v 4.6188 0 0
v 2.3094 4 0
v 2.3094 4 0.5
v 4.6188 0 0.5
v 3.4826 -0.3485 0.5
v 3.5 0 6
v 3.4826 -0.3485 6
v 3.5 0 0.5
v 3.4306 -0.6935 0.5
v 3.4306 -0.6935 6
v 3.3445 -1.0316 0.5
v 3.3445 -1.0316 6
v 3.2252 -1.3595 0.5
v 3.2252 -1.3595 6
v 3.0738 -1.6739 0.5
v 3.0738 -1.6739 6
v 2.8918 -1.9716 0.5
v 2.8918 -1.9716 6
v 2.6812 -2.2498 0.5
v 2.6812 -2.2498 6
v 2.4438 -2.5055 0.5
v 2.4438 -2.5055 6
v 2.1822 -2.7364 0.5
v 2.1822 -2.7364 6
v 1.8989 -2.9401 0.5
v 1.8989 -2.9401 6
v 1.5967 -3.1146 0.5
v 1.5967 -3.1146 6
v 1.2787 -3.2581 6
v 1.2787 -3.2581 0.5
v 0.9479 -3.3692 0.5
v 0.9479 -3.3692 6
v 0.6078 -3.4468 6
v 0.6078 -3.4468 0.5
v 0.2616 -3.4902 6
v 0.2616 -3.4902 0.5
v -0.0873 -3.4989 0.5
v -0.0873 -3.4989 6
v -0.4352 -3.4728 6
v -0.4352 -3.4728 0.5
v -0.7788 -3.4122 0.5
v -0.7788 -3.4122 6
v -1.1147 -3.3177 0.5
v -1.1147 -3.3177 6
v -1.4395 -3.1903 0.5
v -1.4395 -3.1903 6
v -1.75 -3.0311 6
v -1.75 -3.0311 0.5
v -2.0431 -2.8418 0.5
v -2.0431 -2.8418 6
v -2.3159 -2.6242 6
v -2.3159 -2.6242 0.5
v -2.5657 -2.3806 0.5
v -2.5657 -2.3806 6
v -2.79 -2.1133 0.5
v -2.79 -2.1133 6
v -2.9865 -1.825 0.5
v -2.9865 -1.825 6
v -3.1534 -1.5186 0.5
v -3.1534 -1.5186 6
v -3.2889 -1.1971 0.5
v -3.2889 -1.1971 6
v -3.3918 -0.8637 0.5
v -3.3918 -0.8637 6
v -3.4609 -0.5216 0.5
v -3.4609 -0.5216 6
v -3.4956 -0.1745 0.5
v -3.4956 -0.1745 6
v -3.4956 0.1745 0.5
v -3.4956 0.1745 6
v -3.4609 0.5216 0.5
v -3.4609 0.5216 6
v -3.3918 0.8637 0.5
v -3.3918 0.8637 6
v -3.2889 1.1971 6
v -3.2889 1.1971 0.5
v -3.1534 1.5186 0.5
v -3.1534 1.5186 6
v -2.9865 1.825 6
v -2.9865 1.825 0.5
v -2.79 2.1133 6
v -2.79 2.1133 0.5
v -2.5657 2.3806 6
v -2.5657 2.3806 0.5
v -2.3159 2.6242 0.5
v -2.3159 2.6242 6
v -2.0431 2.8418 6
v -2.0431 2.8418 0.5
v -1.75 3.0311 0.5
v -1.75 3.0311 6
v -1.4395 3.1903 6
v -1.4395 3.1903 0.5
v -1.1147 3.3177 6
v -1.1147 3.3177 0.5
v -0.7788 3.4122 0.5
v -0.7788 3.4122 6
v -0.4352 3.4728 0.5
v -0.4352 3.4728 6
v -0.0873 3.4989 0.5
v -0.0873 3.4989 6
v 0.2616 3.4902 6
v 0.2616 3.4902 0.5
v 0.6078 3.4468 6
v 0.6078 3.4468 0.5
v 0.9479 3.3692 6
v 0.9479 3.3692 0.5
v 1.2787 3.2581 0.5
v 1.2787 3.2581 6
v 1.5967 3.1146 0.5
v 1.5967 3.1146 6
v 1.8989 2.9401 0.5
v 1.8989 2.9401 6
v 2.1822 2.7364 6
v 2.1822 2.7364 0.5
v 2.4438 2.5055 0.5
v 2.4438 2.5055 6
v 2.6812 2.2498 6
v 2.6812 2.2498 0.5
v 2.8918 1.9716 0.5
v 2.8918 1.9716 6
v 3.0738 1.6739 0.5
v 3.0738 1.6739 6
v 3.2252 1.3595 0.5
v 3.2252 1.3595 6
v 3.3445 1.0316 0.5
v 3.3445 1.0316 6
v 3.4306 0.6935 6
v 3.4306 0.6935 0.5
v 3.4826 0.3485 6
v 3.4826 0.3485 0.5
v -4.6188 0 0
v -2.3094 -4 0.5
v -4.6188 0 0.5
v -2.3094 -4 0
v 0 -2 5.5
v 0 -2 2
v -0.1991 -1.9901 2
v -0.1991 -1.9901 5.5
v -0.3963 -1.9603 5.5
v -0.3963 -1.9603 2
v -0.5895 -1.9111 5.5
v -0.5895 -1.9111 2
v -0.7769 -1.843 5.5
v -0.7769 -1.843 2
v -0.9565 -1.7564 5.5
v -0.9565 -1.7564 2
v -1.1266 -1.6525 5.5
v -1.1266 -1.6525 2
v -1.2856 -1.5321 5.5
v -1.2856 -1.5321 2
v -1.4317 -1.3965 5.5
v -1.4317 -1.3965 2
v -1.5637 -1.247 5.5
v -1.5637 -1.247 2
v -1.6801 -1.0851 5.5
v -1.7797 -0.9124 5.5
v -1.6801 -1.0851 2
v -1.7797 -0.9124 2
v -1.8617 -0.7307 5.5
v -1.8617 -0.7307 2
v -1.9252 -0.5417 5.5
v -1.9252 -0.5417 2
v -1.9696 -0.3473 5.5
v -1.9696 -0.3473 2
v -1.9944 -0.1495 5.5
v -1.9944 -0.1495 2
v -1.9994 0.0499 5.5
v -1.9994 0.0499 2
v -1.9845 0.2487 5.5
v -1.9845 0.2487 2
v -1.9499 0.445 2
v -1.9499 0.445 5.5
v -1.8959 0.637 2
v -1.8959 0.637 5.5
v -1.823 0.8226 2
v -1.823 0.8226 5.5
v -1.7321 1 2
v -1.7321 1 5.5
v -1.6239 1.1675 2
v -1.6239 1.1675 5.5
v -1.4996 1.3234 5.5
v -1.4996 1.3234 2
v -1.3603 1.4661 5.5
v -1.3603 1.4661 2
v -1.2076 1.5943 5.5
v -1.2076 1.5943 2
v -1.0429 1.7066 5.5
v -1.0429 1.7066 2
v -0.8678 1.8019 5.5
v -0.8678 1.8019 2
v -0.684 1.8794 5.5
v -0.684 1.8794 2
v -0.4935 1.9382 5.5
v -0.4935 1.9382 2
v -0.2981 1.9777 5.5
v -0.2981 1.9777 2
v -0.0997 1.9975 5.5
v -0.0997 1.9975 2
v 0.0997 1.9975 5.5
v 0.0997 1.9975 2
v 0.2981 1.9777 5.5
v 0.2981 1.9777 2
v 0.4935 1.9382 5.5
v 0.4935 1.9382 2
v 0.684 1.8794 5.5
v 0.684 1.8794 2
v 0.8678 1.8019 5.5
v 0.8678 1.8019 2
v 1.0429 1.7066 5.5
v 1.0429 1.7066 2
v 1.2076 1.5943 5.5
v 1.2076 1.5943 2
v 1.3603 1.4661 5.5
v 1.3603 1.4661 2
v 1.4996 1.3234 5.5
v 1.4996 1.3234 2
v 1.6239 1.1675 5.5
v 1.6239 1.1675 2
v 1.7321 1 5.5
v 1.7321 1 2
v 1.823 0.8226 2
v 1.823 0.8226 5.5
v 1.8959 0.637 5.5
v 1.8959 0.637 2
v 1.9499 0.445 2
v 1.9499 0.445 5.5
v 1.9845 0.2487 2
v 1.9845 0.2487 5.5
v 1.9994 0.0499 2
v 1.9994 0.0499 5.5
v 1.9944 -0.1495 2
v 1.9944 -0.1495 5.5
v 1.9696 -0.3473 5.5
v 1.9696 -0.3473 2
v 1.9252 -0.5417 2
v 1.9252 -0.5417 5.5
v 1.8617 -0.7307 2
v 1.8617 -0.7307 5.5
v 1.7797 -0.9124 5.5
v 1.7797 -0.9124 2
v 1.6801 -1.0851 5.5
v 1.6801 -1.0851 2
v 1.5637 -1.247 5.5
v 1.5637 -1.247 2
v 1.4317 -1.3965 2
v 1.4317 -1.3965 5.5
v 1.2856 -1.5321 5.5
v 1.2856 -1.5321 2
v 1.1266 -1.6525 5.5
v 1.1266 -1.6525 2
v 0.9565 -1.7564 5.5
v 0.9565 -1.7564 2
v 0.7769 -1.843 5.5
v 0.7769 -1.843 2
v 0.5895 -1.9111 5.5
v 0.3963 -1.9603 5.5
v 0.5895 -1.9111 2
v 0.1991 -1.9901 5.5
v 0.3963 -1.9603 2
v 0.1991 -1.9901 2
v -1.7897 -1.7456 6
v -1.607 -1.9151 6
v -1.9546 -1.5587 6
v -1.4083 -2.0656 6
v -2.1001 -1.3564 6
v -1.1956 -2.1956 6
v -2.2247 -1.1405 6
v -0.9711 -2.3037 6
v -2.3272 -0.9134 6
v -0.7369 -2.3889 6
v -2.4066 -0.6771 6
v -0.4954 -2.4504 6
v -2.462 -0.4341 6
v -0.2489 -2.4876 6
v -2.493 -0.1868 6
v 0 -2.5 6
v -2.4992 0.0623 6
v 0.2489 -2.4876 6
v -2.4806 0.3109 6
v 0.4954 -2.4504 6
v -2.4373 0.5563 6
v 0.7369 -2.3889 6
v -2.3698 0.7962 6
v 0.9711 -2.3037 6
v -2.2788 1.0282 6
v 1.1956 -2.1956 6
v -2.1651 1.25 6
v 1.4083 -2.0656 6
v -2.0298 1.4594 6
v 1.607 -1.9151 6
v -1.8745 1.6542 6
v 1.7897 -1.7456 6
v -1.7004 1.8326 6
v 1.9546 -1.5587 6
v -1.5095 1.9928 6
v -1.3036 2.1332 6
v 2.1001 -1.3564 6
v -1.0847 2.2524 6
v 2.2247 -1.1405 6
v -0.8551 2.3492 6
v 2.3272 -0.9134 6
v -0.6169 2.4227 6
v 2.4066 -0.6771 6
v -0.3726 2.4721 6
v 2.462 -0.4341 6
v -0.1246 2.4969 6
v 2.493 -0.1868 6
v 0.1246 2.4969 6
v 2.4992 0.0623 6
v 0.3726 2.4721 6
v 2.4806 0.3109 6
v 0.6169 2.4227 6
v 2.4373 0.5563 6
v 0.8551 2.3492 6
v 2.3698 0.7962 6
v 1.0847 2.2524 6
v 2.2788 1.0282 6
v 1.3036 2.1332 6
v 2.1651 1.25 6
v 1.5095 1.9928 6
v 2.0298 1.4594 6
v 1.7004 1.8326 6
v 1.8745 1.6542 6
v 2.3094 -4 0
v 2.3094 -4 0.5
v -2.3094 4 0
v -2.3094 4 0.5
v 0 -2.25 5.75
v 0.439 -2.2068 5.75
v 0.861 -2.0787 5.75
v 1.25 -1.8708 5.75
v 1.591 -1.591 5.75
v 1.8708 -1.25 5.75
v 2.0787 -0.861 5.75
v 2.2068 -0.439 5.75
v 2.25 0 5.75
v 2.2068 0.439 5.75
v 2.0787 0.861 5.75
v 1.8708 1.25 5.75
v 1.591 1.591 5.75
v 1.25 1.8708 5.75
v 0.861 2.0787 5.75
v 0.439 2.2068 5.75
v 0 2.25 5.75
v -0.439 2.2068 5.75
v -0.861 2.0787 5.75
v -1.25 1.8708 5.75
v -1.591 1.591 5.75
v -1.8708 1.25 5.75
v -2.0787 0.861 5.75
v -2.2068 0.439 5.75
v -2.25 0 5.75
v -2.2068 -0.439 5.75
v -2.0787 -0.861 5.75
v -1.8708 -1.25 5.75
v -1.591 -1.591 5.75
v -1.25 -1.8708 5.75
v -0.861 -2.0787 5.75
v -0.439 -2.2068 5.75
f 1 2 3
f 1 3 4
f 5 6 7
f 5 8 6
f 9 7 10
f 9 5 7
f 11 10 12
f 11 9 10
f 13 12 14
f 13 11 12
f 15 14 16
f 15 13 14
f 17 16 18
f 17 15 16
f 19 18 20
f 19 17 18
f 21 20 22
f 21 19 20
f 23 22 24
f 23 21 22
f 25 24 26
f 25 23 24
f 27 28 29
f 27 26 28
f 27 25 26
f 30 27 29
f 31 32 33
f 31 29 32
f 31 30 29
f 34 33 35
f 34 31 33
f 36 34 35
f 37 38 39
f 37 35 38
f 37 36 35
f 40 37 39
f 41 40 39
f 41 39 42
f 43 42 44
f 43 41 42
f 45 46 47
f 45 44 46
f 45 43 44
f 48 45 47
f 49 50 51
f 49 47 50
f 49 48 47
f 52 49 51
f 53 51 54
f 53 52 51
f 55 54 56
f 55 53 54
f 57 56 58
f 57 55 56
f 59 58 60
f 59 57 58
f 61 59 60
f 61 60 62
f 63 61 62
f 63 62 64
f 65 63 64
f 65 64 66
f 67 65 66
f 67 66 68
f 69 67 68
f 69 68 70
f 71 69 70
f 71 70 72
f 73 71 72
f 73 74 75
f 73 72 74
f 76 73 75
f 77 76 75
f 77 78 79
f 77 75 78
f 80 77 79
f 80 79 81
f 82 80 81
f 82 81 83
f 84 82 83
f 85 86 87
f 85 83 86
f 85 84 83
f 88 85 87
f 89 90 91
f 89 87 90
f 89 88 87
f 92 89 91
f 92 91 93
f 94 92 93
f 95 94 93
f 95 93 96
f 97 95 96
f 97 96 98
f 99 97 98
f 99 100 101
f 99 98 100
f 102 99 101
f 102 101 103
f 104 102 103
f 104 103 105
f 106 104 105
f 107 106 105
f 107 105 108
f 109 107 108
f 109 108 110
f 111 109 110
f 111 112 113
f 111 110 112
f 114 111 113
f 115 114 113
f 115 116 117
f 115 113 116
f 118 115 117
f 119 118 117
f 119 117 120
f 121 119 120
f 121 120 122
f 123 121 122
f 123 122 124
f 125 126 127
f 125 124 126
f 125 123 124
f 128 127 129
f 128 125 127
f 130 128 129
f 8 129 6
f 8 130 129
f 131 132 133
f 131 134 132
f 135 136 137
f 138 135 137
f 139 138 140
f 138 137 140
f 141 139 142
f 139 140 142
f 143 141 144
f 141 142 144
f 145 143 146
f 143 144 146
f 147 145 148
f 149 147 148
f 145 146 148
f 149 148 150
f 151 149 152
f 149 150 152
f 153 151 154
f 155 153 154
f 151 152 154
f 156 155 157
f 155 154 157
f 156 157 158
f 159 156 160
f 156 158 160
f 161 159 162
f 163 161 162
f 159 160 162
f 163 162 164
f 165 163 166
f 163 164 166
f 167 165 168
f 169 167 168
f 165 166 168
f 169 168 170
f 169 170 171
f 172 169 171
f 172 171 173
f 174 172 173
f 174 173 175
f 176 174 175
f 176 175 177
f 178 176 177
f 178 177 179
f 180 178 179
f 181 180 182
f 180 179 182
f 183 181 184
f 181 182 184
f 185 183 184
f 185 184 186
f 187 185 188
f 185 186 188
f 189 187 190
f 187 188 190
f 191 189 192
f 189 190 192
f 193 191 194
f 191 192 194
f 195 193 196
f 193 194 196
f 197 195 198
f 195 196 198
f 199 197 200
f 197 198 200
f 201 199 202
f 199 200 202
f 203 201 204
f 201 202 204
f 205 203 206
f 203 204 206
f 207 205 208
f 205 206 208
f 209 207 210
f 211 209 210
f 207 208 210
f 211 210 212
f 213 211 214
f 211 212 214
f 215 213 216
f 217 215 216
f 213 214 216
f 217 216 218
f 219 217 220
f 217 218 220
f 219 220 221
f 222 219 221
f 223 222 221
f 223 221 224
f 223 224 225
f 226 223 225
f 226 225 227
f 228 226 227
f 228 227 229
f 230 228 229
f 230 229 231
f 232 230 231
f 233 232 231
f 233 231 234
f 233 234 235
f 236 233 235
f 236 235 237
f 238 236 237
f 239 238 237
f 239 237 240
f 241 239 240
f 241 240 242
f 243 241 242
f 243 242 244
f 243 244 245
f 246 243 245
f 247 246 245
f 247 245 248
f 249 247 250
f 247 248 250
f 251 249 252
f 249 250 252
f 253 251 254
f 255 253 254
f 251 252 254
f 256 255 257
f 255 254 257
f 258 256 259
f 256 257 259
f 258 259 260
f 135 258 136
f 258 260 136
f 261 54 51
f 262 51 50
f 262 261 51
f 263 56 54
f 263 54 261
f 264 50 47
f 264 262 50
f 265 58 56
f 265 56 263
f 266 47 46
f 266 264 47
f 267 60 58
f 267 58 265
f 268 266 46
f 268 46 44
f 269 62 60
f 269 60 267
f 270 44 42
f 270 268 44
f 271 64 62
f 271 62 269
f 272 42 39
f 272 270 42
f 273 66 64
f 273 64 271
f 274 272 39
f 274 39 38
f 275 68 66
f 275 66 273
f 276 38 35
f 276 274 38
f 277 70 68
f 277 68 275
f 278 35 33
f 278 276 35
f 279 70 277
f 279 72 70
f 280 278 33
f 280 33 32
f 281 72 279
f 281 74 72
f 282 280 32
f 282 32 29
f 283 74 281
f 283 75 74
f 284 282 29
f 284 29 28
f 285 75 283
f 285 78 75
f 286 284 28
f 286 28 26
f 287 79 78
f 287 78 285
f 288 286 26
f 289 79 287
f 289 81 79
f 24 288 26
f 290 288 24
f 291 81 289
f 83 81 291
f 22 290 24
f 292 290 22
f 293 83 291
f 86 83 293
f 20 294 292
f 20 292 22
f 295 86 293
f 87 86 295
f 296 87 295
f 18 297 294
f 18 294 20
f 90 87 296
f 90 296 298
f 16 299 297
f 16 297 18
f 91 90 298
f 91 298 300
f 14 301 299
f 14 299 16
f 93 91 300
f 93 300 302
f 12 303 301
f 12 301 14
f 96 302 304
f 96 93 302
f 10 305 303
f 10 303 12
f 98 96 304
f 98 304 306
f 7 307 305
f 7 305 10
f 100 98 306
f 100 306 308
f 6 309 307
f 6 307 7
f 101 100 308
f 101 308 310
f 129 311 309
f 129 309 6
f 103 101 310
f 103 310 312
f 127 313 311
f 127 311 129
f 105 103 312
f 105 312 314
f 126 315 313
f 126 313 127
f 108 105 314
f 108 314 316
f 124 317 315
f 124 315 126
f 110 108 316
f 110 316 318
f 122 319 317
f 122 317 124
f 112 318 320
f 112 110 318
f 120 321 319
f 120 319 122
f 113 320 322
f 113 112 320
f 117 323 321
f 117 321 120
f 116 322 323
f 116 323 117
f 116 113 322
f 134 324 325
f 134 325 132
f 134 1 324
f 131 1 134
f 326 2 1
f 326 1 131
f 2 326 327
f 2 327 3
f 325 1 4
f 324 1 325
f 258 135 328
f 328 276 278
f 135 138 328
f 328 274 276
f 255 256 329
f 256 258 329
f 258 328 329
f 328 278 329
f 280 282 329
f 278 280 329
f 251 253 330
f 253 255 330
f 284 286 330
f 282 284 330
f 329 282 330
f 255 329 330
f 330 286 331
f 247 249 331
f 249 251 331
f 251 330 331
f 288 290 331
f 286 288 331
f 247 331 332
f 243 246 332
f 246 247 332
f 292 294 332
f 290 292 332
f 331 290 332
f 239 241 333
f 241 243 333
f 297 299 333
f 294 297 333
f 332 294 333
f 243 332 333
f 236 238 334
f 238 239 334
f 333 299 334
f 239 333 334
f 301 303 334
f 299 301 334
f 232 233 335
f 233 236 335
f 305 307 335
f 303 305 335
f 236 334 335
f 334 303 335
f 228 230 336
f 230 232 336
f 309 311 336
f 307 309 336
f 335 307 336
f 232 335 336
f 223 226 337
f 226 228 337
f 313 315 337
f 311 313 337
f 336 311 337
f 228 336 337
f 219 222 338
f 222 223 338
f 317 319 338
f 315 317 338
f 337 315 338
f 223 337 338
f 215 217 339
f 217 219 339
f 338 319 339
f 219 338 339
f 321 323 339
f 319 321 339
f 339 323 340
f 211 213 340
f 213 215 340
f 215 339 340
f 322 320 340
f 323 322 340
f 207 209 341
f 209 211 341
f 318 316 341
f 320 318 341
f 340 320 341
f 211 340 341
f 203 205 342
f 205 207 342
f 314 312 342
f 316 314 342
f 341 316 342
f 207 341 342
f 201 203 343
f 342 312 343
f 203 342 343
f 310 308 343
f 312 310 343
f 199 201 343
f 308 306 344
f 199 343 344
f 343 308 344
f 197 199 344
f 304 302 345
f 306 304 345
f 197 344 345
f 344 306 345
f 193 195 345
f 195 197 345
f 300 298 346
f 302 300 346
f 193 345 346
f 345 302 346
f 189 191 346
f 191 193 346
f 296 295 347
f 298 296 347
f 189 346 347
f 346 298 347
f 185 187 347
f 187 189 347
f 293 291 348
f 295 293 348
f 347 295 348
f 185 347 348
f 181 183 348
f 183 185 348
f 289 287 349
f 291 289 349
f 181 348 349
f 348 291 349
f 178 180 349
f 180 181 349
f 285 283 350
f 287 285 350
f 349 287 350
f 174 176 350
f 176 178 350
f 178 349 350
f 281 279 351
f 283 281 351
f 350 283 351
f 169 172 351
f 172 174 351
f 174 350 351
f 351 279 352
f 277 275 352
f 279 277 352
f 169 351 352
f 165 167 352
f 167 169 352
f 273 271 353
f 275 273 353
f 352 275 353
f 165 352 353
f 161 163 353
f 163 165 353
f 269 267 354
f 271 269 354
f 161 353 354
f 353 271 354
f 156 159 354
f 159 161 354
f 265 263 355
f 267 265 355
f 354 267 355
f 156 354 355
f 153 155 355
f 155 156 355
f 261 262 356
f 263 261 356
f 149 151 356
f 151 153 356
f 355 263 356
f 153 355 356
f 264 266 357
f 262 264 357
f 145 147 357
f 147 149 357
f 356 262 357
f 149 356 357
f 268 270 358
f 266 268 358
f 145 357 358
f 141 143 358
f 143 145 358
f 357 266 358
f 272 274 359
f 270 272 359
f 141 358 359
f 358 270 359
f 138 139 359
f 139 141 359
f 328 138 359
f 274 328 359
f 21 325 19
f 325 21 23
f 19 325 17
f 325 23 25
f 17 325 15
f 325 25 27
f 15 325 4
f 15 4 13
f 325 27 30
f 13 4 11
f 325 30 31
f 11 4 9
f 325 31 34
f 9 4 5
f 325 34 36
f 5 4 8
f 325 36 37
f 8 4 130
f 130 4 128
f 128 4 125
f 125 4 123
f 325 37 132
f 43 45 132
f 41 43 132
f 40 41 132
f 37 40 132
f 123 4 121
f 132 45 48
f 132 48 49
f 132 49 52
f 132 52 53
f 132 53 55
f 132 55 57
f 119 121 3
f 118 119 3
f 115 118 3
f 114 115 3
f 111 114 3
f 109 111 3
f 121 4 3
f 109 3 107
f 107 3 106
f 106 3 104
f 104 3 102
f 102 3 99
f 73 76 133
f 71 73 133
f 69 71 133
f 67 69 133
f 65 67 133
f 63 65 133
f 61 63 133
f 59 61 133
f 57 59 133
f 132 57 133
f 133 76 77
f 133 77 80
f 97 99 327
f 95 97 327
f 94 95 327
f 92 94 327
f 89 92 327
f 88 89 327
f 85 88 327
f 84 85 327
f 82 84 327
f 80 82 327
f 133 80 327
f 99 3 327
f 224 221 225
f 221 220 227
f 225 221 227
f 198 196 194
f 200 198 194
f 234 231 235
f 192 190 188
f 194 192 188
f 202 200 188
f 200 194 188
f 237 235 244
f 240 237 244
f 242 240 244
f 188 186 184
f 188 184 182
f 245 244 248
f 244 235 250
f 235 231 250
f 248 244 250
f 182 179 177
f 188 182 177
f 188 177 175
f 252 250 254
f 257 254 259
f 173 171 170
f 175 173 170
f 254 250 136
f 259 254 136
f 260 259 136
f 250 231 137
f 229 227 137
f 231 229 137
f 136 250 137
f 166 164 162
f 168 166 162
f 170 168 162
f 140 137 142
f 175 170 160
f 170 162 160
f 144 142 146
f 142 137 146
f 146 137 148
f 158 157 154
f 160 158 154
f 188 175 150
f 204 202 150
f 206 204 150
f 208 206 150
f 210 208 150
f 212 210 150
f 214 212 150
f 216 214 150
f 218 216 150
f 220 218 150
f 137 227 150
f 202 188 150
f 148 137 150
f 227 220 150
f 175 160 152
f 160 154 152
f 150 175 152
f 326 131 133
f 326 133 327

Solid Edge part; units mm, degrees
sketch "Sketch1" plane through (0, 0, 0) normal (0, 0, 1) x (1, 0, 0)
  line L0 (-2.3094, 4) -> (2.3094, 4)
  line L1 (2.3094, 4) -> (4.6188, 0)
  line L2 (4.6188, 0) -> (2.3094, -4)
  line L3 (2.3094, -4) -> (-2.3094, -4)
  line L4 (-2.3094, -4) -> (-4.6188, 0)
  line L5 (-4.6188, 0) -> (-2.3094, 4)
  dimension "D1" = 8
extrude "Protrusion1" add sketch "Sketch1" along normal blind 0.5
sketch "Sketch2" plane through (0, 0, 0.5) normal (0, 0, 1) x (1, 0, 0)
  circle A0 centre (0, 0) radius 3.5
  dimension "D1" = 7
extrude "Ausprägung_2" add sketch "Sketch2" along normal blind 5.5
hole "Bohrung_1" at (0, 0, 6) direction (0, 0, -1) diameter 4 depth 4
chamfer "Fase_1" distance 0.5 angle 45 1 edges at (0, 2, 6)
